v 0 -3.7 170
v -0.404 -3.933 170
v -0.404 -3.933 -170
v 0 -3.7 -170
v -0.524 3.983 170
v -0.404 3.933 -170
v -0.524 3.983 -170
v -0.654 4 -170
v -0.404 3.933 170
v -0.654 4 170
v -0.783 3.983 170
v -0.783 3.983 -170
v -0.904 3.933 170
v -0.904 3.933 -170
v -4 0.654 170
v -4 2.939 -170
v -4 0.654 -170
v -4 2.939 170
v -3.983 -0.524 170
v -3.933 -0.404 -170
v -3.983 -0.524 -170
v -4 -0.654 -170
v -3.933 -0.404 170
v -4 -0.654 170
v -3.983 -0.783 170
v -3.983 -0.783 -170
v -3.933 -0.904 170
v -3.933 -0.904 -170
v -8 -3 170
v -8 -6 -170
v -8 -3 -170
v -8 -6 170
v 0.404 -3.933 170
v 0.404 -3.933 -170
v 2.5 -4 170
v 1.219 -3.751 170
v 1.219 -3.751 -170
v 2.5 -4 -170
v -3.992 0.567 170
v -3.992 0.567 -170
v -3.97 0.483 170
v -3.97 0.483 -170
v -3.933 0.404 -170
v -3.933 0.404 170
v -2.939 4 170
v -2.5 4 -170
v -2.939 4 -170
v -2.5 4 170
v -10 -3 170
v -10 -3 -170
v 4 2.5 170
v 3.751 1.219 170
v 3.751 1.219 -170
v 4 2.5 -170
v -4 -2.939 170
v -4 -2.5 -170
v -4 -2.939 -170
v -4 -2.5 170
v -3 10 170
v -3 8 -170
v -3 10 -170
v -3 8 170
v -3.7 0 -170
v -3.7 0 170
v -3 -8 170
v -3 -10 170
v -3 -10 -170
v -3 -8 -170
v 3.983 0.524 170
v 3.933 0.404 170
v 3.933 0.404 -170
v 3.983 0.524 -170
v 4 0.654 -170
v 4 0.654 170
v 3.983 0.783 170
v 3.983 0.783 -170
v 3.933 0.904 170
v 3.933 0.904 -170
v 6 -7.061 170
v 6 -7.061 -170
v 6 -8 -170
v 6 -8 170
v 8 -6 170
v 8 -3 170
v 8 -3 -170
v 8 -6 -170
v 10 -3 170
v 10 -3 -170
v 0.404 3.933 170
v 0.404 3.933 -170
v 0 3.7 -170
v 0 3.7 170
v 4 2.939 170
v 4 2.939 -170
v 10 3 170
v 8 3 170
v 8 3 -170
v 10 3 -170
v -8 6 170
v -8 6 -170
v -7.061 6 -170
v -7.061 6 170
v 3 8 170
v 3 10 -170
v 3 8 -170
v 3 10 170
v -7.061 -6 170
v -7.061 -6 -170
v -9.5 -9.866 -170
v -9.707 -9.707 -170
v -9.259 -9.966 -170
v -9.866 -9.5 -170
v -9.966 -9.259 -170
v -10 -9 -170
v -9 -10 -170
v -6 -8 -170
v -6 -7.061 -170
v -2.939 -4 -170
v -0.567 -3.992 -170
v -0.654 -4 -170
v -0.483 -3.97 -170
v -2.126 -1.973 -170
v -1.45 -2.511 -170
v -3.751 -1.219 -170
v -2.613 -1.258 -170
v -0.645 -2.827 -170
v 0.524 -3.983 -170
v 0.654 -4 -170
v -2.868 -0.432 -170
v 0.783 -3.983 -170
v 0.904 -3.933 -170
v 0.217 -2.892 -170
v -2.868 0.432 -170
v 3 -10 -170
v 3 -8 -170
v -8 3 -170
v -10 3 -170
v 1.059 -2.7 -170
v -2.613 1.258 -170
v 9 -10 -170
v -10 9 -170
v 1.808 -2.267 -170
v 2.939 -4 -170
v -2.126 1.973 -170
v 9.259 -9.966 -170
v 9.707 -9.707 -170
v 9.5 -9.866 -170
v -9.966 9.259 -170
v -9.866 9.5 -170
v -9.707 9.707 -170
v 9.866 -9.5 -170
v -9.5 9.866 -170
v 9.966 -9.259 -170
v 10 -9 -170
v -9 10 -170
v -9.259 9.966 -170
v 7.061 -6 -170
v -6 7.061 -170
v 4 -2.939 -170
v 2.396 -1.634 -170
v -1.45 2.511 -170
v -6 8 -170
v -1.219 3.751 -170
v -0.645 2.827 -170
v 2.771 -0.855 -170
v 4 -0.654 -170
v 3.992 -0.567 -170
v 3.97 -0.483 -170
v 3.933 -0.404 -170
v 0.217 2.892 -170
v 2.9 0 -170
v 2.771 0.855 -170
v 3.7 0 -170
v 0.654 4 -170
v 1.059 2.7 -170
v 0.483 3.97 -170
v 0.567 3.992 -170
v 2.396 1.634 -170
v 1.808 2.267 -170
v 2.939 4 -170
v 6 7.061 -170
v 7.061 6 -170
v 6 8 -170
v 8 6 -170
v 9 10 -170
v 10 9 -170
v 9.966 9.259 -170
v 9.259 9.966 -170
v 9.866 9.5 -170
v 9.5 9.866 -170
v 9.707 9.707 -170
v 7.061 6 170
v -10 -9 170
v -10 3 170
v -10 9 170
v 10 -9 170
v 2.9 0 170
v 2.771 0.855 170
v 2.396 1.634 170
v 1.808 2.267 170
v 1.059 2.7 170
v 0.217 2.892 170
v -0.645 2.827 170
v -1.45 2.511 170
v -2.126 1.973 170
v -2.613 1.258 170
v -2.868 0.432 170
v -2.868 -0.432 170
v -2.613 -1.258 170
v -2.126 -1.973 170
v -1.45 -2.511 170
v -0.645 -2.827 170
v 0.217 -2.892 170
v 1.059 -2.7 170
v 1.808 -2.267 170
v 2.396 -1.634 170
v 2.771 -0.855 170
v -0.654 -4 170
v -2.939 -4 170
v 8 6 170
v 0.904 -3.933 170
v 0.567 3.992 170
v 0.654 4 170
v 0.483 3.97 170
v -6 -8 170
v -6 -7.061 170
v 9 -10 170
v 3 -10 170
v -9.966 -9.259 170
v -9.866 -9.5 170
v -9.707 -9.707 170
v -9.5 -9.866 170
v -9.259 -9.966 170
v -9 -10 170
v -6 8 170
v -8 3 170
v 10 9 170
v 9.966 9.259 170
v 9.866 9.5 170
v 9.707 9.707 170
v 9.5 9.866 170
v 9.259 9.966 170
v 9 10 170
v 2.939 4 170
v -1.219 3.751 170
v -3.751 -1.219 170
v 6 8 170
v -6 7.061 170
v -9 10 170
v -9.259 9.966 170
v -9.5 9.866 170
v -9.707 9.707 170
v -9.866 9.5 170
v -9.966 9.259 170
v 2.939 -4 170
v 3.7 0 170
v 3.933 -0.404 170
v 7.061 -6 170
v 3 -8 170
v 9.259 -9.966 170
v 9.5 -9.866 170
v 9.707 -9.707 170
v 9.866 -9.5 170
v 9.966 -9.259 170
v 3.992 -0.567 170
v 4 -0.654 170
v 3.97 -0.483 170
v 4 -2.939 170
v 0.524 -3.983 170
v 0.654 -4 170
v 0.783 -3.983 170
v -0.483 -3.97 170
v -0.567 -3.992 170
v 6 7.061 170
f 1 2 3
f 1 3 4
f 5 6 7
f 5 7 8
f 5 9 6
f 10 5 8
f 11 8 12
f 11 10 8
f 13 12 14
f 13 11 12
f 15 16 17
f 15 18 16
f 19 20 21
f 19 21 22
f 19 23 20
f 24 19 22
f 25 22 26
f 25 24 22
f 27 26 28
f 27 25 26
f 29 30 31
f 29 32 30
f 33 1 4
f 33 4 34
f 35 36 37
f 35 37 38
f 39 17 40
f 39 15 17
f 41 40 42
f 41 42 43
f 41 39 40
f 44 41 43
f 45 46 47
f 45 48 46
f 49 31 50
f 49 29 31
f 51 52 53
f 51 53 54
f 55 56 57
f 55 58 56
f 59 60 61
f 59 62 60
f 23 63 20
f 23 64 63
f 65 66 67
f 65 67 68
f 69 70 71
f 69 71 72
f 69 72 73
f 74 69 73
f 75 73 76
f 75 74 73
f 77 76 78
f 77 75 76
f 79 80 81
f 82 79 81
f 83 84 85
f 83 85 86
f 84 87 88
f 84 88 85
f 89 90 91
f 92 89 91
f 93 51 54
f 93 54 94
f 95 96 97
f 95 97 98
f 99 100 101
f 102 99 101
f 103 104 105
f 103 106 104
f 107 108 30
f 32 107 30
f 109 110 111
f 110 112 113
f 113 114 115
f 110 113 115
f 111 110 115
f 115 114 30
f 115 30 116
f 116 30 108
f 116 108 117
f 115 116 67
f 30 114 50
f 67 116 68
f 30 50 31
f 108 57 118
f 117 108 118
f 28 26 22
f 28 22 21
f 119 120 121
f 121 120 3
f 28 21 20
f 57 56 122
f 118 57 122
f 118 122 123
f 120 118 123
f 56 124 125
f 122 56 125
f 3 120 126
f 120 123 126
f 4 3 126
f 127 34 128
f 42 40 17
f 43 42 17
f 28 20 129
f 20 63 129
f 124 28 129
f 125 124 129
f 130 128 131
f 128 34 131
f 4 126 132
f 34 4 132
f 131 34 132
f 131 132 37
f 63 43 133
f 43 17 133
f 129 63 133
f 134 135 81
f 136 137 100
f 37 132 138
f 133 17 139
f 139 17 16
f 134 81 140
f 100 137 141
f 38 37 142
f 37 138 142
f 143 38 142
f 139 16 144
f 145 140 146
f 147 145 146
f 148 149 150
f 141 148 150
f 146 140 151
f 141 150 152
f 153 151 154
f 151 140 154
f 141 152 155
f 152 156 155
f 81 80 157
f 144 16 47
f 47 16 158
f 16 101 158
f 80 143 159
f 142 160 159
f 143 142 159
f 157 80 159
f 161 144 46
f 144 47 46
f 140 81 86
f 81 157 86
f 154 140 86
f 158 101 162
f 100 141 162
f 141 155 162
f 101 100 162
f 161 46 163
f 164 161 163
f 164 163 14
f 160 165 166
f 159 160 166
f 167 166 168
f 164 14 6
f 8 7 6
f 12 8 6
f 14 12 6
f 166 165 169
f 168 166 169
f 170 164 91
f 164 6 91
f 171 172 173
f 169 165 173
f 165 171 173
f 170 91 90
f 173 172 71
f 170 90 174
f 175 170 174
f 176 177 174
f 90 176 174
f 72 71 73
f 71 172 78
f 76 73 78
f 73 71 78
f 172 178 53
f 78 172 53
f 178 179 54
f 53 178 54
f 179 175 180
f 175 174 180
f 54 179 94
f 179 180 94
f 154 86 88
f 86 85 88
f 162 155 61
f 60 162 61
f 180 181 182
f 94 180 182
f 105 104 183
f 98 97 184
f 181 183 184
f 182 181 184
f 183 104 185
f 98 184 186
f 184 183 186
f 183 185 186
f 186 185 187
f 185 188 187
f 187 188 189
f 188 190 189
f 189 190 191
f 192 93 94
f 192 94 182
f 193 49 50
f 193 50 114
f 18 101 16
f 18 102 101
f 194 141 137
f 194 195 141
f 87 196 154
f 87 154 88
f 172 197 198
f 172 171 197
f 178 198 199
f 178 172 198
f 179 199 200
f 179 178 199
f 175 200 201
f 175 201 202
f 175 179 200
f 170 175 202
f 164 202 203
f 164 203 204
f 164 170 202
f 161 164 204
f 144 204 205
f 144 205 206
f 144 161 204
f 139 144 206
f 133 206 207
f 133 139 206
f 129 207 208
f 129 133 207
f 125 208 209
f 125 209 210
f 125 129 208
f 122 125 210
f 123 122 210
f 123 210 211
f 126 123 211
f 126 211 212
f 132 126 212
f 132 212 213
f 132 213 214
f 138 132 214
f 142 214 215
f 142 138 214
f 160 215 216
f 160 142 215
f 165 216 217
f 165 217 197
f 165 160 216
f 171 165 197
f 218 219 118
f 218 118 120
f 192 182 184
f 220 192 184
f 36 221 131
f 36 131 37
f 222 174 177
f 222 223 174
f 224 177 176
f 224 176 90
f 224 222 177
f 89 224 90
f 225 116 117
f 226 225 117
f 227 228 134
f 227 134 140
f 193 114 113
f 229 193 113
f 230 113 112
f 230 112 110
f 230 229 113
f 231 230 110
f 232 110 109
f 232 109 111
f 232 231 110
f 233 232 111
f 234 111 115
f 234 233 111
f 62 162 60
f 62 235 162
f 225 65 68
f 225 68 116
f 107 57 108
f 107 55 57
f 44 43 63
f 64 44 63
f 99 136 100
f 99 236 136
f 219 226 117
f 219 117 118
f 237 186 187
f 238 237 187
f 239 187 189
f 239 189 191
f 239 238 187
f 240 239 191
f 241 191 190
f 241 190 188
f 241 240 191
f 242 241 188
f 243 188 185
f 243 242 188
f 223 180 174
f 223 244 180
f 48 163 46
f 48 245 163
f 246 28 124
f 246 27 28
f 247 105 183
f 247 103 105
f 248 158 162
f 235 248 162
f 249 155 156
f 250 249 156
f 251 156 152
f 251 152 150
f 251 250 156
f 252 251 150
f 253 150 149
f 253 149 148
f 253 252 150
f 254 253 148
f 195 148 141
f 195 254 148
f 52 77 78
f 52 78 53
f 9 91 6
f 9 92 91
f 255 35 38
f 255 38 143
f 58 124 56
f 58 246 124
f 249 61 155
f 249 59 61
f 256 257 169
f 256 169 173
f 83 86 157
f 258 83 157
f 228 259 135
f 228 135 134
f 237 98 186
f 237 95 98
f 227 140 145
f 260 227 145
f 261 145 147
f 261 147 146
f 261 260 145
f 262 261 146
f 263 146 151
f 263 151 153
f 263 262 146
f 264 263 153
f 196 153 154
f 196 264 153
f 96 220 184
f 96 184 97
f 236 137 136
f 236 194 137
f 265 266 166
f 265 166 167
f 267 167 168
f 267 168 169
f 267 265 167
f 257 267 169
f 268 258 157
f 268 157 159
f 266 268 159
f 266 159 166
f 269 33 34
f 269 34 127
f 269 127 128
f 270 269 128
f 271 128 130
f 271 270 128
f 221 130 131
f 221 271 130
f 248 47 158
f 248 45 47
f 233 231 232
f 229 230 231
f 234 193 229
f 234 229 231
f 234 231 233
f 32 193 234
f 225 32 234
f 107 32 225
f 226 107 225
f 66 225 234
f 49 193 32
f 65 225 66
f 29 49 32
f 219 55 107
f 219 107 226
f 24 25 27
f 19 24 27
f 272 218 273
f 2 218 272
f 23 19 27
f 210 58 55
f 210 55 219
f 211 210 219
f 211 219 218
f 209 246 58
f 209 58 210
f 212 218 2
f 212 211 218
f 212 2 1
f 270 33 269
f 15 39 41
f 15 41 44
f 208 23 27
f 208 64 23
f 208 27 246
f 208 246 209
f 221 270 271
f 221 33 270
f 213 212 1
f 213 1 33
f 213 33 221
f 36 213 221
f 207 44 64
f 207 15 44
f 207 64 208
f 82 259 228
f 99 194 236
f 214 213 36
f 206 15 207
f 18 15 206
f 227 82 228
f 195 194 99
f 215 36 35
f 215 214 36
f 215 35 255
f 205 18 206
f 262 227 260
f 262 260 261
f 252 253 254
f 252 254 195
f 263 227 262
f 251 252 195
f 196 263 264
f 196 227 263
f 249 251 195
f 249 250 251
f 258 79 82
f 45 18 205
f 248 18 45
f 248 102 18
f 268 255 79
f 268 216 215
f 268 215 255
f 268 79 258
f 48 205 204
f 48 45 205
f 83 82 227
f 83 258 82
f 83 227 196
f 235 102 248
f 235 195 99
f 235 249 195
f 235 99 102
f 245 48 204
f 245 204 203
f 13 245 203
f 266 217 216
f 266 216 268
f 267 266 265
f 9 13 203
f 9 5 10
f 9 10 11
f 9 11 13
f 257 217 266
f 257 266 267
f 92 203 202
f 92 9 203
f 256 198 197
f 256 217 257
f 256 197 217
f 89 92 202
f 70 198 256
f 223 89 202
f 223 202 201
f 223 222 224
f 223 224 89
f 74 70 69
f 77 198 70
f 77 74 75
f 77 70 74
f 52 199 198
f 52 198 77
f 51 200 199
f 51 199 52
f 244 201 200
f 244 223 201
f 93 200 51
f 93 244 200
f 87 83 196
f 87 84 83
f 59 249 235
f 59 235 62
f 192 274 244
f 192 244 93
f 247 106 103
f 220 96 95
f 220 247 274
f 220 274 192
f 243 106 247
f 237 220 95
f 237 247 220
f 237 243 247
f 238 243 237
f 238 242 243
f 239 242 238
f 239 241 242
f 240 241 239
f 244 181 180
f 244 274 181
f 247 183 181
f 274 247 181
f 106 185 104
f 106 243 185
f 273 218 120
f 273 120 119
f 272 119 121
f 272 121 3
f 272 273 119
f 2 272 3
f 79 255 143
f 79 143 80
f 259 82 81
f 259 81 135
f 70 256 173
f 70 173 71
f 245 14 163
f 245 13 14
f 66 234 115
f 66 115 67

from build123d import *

# Parameters (mm, degrees)
SKETCH001_R = 2.9
PAD_DEPTH   = 170


with BuildPart() as part:
    # Sketch001 → Pad (new body, symmetric)
    with BuildSketch(Plane.XY):
        with BuildLine():
            Line((-8, -3), (-10, -3))
            Line((-10, -3), (-10, -9))
            ThreePointArc((-10, -9), (-9.707107, -9.707107), (-9, -10))
            Line((-9, -10), (-3, -10))
            Line((-3, -10), (-3, -8))
            Line((-3, -8), (-6, -8))
            Line((-6, -8), (-6, -7.06066))
            Line((-6, -7.06066), (-2.93934, -4))
            Line((-2.93934, -4), (-0.65359, -4))
            ThreePointArc((-0.65359, -4), (-0.52418, -3.982963), (-0.40359, -3.933013))
            Line((-0.40359, -3.933013), (0, -3.7))
            Line((0, -3.7), (0.40359, -3.933013))
            ThreePointArc((0.40359, -3.933013), (0.65359, -4), (0.90359, -3.933013))
            Line((0.90359, -3.933013), (1.218886, -3.750977))
            Line((1.218886, -3.750977), (2.5, -4))
            Line((2.5, -4), (2.93934, -4))
            Line((2.93934, -4), (6, -7.06066))
            Line((6, -7.06066), (6, -8))
            Line((6, -8), (3, -8))
            Line((3, -8), (3, -10))
            Line((3, -10), (9, -10))
            ThreePointArc((9, -10), (9.707107, -9.707107), (10, -9))
            Line((10, -9), (10, -3))
            Line((10, -3), (8, -3))
            Line((8, -3), (8, -6))
            Line((8, -6), (7.06066, -6))
            Line((7.06066, -6), (4, -2.93934))
            Line((4, -2.93934), (4, -0.65359))
            ThreePointArc((4, -0.65359), (3.982963, -0.52418), (3.933013, -0.40359))
            Line((3.933013, -0.40359), (3.7, 0))
            Line((3.7, 0), (3.933013, 0.40359))
            ThreePointArc((3.933013, 0.40359), (4, 0.65359), (3.933013, 0.90359))
            Line((3.933013, 0.90359), (3.750977, 1.218886))
            Line((3.750977, 1.218886), (4, 2.5))
            Line((4, 2.5), (4, 2.93934))
            Line((4, 2.93934), (7.06066, 6))
            Line((7.06066, 6), (8, 6))
            Line((8, 6), (8, 3))
            Line((8, 3), (10, 3))
            Line((10, 3), (10, 9))
            ThreePointArc((10, 9), (9.707107, 9.707107), (9, 10))
            Line((9, 10), (3, 10))
            Line((3, 10), (3, 8))
            Line((3, 8), (6, 8))
            Line((6, 8), (6, 7.06066))
            Line((6, 7.06066), (2.93934, 4))
            Line((2.93934, 4), (0.65359, 4))
            ThreePointArc((0.65359, 4), (0.52418, 3.982963), (0.40359, 3.933013))
            Line((0.40359, 3.933013), (0, 3.7))
            Line((0, 3.7), (-0.40359, 3.933013))
            ThreePointArc((-0.40359, 3.933013), (-0.65359, 4), (-0.90359, 3.933013))
            Line((-0.90359, 3.933013), (-1.218886, 3.750977))
            Line((-1.218886, 3.750977), (-2.5, 4))
            Line((-2.5, 4), (-2.93934, 4))
            Line((-2.93934, 4), (-6, 7.06066))
            Line((-6, 7.06066), (-6, 8))
            Line((-6, 8), (-3, 8))
            Line((-3, 8), (-3, 10))
            Line((-3, 10), (-9, 10))
            ThreePointArc((-9, 10), (-9.707107, 9.707107), (-10, 9))
            Line((-10, 9), (-10, 3))
            Line((-10, 3), (-8, 3))
            Line((-8, 3), (-8, 6))
            Line((-8, 6), (-7.06066, 6))
            Line((-7.06066, 6), (-4, 2.93934))
            Line((-4, 2.93934), (-4, 0.65359))
            ThreePointArc((-4, 0.65359), (-3.982963, 0.52418), (-3.933013, 0.40359))
            Line((-3.933013, 0.40359), (-3.7, 0))
            Line((-3.7, 0), (-3.933013, -0.40359))
            ThreePointArc((-3.933013, -0.40359), (-4, -0.65359), (-3.933013, -0.90359))
            Line((-3.933013, -0.90359), (-3.750977, -1.218886))
            Line((-3.750977, -1.218886), (-4, -2.5))
            Line((-4, -2.5), (-4, -2.93934))
            Line((-4, -2.93934), (-7.06066, -6))
            Line((-7.06066, -6), (-8, -6))
            Line((-8, -6), (-8, -3))
        make_face()
        Circle(SKETCH001_R, mode=Mode.SUBTRACT)
    extrude(amount=PAD_DEPTH, both=True)


solid = part.part
